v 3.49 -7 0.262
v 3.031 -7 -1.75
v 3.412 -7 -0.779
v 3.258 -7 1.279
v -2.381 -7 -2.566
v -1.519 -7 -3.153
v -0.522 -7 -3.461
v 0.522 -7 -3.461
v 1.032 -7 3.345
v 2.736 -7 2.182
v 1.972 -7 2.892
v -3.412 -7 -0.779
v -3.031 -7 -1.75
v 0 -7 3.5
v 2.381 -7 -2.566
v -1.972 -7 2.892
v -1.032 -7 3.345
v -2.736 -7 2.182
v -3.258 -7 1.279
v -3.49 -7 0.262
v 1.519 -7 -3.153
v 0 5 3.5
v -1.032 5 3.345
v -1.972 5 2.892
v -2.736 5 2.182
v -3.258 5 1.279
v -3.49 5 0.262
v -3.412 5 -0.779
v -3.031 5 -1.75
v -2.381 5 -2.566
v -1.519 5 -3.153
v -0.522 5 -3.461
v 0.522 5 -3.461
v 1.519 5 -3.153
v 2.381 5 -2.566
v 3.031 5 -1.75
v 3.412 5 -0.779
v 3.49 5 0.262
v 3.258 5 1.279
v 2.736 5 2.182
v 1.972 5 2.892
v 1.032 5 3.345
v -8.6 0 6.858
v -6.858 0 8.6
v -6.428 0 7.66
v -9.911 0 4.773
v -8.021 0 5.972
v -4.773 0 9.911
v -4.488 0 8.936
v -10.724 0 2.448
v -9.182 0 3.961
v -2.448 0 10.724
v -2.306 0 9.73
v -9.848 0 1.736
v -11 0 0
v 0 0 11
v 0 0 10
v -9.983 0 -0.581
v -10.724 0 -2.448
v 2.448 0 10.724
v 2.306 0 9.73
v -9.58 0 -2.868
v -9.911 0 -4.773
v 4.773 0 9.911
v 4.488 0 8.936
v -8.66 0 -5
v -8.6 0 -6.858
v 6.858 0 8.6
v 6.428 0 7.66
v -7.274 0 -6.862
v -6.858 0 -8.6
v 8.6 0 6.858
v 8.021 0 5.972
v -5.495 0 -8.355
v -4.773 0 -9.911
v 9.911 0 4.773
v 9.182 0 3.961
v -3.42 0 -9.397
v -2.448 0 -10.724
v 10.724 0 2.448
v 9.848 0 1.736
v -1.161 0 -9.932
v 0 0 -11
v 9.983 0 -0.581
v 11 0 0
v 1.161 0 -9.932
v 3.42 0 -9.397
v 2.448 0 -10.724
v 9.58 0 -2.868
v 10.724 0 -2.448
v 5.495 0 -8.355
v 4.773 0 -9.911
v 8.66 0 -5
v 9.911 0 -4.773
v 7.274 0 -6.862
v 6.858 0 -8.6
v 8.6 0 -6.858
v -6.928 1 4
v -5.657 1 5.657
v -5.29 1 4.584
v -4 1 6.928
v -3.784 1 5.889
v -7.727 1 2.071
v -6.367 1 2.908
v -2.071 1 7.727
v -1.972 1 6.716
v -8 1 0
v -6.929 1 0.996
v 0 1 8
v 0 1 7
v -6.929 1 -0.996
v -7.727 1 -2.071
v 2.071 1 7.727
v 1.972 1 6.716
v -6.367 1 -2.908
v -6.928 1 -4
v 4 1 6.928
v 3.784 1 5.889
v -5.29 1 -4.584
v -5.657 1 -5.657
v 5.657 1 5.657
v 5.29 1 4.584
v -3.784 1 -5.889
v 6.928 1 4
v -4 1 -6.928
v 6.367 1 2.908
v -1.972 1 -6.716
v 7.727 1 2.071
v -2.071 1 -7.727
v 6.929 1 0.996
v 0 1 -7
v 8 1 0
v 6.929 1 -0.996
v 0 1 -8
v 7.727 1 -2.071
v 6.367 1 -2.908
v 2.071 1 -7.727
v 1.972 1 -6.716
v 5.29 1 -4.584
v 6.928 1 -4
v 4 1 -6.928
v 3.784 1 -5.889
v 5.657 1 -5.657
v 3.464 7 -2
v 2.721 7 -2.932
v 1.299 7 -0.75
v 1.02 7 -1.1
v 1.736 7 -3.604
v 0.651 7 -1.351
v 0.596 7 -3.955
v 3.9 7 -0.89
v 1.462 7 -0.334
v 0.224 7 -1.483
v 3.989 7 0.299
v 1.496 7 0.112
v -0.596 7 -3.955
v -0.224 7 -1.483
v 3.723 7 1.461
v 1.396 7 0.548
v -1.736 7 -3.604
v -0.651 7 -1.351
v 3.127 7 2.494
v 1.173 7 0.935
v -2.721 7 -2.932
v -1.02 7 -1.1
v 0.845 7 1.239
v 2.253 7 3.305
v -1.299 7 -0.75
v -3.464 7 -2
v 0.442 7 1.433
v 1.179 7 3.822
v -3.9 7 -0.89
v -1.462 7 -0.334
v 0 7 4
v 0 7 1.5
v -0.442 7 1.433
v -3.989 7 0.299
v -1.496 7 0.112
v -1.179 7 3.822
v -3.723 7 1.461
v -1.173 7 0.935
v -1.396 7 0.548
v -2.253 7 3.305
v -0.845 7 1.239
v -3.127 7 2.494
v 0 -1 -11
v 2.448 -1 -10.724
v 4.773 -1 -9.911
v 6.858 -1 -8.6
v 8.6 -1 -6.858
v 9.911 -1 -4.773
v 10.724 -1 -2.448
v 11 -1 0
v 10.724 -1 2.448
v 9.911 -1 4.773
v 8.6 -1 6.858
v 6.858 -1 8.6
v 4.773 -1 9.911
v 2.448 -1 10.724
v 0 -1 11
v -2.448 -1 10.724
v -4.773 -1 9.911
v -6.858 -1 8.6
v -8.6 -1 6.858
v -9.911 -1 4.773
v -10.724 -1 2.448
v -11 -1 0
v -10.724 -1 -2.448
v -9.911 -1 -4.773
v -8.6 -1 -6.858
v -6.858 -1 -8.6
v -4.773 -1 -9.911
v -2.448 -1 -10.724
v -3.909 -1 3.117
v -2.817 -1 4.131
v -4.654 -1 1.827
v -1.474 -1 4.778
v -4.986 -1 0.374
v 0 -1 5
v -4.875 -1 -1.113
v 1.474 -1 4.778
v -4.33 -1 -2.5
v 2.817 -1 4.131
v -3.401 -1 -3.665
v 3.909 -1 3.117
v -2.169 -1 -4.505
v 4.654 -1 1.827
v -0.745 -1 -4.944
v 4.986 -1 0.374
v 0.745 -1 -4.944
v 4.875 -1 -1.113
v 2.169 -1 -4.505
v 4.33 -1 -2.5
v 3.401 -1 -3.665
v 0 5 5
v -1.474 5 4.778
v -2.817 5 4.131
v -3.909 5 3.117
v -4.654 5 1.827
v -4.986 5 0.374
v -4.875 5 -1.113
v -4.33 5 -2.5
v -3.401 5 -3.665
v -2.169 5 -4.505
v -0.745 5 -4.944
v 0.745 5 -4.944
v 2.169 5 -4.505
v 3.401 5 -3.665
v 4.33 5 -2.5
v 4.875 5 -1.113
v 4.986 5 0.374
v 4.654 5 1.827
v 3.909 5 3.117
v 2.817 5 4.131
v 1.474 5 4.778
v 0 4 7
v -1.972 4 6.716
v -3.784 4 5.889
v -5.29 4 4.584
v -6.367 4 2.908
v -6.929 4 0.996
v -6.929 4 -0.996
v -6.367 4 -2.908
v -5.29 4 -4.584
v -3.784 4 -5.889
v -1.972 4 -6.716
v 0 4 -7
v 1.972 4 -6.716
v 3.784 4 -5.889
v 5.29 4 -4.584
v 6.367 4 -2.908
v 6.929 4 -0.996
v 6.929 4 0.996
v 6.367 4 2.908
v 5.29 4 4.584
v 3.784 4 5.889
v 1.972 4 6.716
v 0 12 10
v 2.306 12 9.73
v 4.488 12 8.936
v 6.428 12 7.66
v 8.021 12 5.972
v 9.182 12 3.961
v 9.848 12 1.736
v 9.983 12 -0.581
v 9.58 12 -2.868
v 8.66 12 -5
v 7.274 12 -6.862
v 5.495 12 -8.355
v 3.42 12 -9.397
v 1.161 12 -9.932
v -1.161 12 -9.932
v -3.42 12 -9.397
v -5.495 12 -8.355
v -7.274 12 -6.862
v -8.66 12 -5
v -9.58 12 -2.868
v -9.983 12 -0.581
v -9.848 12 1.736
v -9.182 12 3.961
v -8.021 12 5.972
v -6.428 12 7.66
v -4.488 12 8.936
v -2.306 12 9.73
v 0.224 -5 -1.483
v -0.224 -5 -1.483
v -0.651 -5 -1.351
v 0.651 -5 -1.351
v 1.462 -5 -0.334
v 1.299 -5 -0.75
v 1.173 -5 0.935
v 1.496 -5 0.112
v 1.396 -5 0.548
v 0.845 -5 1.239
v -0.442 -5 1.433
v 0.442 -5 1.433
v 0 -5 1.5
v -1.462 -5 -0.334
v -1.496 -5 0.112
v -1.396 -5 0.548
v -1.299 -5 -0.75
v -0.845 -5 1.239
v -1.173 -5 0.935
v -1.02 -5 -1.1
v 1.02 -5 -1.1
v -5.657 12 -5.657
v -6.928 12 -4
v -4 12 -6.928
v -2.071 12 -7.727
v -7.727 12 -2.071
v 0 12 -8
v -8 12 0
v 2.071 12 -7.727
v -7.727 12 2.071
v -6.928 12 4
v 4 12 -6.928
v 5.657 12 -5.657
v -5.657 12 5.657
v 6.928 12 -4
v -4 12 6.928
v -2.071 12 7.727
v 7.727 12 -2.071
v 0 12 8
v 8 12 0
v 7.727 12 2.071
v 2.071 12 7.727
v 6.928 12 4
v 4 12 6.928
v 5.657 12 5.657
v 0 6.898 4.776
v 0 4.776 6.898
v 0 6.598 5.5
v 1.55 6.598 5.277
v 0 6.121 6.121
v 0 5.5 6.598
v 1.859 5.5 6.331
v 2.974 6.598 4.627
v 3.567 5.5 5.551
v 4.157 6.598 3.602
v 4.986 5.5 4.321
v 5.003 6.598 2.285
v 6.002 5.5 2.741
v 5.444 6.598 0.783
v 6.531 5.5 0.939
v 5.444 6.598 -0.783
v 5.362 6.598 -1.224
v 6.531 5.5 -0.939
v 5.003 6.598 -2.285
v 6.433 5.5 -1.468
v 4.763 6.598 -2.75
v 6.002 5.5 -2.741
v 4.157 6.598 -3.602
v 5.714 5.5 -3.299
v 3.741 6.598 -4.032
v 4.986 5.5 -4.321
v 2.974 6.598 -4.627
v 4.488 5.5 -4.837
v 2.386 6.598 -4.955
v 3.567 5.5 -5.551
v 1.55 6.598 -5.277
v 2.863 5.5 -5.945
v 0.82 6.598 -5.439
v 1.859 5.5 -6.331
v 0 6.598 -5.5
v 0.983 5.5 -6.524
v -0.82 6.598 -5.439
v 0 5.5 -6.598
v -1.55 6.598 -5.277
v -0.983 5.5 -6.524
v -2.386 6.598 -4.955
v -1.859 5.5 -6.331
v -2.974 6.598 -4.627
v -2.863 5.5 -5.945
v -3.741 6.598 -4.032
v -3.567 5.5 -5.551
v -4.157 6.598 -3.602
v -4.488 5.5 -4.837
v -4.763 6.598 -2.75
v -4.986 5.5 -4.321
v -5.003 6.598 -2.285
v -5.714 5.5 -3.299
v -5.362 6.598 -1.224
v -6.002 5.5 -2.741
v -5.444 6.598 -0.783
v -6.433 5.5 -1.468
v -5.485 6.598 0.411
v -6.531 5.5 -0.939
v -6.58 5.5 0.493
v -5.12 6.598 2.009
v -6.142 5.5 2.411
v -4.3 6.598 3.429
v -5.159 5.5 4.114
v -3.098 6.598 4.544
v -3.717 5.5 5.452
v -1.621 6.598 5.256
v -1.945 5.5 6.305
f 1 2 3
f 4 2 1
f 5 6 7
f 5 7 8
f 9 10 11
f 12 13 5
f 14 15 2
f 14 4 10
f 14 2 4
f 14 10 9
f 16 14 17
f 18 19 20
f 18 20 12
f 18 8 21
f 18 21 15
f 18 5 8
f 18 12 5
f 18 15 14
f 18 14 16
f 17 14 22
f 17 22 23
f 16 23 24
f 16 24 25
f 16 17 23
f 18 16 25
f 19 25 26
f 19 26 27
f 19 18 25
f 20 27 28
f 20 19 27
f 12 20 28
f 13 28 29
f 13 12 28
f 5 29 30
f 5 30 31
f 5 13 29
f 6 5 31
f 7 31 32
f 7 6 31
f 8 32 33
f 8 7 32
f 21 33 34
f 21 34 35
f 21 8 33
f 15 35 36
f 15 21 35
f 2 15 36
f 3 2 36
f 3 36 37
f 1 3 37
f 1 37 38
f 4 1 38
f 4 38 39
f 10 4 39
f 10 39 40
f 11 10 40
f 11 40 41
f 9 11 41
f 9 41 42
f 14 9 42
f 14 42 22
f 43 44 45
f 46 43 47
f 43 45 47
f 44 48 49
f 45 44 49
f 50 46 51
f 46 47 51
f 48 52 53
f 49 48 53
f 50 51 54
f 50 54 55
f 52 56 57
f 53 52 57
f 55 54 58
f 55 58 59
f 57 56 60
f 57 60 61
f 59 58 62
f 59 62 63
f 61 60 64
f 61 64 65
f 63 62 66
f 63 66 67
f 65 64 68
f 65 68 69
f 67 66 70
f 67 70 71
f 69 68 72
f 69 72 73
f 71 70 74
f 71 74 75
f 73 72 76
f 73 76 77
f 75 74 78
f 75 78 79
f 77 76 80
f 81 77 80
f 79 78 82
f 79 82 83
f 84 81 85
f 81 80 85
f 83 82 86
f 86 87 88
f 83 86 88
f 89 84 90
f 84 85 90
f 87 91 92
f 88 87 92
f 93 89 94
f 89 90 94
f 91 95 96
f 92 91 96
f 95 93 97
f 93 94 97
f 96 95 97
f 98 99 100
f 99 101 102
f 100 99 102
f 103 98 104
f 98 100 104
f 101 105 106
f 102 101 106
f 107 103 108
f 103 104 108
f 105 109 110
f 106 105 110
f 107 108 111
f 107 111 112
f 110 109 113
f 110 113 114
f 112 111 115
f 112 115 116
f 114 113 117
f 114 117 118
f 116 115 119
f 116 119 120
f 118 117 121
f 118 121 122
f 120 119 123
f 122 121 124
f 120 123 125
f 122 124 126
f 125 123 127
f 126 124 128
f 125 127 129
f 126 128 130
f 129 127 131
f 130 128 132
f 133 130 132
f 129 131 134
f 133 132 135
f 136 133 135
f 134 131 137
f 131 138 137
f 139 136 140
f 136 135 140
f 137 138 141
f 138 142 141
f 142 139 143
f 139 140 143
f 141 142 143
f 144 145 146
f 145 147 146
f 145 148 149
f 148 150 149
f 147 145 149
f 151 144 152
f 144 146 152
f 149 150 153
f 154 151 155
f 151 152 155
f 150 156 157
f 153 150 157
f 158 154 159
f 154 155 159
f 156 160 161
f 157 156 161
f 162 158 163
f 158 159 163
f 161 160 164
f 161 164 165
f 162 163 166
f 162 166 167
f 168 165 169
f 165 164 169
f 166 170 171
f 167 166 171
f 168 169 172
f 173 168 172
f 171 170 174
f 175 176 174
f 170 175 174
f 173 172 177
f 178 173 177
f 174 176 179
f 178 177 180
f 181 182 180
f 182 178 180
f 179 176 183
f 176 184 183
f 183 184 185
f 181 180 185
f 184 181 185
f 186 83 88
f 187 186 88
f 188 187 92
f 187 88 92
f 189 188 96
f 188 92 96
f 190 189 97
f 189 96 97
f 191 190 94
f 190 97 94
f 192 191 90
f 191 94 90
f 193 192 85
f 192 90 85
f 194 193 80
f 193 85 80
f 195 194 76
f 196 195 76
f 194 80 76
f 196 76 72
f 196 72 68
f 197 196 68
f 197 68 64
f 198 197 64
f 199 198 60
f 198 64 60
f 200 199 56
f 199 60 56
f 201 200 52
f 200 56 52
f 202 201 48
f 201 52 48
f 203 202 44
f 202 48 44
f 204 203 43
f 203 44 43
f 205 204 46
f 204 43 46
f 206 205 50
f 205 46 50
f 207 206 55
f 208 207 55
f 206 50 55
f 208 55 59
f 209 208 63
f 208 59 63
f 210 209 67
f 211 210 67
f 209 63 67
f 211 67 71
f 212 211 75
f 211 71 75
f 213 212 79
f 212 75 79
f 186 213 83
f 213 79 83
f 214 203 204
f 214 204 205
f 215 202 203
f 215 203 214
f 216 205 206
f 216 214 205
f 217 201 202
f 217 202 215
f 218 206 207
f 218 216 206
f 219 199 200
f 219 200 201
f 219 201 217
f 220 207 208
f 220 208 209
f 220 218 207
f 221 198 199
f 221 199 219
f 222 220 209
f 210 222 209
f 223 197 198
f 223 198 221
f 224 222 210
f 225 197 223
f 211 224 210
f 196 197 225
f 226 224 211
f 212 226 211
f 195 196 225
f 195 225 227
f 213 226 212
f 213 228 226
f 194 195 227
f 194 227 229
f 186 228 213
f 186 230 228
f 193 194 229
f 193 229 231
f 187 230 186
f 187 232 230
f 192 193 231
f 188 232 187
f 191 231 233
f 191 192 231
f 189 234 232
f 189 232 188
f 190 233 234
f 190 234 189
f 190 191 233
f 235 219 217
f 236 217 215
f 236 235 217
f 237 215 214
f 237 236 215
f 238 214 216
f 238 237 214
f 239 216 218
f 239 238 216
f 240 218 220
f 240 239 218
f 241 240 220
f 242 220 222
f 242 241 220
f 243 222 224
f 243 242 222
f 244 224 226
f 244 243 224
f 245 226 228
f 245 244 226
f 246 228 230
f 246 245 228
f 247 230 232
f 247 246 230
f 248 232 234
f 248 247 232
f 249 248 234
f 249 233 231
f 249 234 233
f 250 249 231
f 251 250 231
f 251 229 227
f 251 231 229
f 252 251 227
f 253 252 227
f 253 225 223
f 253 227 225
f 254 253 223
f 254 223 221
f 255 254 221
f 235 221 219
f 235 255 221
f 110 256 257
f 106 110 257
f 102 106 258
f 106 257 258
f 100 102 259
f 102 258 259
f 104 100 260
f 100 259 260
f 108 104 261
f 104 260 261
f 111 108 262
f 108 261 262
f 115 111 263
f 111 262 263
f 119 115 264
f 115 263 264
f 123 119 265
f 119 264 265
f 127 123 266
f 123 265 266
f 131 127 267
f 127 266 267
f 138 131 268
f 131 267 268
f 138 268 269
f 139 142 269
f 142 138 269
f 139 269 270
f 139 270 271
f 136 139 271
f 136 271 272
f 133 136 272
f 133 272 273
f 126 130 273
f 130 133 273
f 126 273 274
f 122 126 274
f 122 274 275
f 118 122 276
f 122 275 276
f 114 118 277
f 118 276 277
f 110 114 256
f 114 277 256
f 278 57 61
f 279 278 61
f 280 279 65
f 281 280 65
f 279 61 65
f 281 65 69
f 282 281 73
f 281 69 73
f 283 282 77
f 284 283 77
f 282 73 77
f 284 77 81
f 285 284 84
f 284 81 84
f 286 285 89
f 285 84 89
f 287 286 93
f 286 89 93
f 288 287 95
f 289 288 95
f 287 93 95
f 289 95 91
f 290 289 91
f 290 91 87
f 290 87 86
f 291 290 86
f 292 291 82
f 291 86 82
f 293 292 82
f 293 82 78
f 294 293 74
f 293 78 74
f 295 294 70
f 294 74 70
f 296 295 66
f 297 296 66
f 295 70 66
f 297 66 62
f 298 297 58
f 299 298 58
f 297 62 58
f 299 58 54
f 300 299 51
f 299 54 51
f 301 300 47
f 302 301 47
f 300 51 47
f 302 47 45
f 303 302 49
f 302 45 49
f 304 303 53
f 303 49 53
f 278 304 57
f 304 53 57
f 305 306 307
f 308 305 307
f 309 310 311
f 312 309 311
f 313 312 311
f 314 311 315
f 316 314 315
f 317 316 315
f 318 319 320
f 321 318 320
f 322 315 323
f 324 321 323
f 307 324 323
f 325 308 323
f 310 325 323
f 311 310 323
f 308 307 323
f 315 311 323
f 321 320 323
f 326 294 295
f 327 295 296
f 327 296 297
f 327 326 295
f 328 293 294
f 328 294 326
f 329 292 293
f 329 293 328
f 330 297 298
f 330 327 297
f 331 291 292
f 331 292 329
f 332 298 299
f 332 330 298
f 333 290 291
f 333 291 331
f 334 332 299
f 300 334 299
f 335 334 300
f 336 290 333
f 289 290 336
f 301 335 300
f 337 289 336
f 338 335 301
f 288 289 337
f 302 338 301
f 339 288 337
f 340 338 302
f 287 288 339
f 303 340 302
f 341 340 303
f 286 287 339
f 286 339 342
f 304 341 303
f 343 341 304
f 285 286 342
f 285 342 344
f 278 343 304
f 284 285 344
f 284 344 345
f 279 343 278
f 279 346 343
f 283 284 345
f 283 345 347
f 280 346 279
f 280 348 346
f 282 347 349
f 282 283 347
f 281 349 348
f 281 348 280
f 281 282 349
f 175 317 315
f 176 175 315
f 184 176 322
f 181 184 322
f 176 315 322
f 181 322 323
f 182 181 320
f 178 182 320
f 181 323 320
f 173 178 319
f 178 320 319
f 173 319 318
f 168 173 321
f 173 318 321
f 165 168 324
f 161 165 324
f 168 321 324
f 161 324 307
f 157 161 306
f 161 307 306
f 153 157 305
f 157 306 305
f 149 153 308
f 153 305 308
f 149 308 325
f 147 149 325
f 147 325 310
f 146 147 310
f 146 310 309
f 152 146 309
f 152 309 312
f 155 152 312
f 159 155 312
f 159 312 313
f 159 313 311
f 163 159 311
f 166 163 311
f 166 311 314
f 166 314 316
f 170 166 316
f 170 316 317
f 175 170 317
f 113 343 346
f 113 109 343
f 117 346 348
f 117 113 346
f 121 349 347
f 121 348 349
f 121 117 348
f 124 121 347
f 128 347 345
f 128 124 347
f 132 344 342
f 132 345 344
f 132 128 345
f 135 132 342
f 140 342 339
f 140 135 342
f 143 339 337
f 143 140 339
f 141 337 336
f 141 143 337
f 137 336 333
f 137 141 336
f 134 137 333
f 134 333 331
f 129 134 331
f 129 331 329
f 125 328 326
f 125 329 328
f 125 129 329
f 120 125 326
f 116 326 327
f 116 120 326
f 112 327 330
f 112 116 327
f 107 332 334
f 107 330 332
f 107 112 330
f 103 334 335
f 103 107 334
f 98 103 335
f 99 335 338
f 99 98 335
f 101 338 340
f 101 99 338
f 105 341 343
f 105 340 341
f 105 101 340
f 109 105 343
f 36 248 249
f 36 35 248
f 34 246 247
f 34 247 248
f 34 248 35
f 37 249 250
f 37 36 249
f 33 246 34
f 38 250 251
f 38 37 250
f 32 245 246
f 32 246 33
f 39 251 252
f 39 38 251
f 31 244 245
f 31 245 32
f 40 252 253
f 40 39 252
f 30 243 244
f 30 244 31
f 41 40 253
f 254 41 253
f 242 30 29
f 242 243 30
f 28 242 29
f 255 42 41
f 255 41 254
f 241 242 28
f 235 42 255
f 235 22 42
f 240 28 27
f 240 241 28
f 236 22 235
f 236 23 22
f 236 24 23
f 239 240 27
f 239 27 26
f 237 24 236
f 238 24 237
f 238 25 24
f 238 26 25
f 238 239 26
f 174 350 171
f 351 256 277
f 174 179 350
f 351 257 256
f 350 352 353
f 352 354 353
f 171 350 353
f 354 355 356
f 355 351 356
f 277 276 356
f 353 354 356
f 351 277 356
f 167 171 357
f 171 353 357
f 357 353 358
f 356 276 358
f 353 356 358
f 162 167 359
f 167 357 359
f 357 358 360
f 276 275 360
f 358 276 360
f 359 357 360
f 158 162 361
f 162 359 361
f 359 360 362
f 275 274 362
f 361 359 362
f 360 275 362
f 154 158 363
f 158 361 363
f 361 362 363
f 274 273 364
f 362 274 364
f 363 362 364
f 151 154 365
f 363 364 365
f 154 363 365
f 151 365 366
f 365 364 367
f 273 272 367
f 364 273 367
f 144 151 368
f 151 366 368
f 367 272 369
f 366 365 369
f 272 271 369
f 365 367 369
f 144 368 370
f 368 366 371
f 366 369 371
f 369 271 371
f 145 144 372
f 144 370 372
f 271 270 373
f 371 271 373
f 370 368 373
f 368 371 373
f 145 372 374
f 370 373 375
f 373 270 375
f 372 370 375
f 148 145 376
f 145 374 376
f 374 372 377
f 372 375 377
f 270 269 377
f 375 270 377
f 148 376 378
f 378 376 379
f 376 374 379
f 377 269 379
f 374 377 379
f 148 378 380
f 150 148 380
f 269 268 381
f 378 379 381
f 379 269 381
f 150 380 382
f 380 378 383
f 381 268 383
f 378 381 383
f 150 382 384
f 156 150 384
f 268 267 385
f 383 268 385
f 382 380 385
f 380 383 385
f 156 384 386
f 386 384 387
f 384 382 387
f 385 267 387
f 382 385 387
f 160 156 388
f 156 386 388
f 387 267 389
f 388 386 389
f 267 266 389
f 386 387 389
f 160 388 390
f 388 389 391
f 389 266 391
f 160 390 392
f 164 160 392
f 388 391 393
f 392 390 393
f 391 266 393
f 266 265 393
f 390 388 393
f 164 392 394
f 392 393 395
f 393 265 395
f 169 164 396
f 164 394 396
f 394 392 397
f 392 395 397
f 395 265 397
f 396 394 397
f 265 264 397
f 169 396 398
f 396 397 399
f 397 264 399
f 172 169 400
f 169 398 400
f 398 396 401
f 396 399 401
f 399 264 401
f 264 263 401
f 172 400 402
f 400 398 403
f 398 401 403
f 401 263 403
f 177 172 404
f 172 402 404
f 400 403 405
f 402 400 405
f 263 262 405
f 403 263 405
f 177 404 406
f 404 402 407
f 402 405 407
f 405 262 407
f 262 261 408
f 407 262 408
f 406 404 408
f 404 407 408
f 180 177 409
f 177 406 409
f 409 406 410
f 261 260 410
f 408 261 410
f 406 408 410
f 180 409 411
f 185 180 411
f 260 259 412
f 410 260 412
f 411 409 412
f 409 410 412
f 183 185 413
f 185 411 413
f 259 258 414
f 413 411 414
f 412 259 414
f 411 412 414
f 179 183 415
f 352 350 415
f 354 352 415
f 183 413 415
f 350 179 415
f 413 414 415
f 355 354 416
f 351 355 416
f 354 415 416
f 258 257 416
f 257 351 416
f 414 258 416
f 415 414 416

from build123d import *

# Parameters (mm, degrees)
SKETCH_1_R               = 10
EXTRUDE_1_DEPTH          = 12
SKETCH_2_R               = 11
EXTRUDE_2_DEPTH          = 1
CUT_EXTRUDE_1_DEPTH      = 21.273134933
CUT_EXTRUDE_1_DEPTH_BACK = 6
SKETCH_3_R               = 5
SKETCH_3_R_2             = 3.5
EXTRUDE_START            = 6
SKETCH_5_R               = 3.5
EXTRUDE_3_DEPTH          = 6
SHELL_1_T                = -2
FILLET_1_R               = 3


with BuildPart() as part:
    # ｽｹｯﾁ1 → ﾎﾞｽ - 押し出し1 (new body)
    with BuildSketch(Plane(origin=(0, 0, 0), x_dir=(1, 0, 0), z_dir=(0, 1, 0))):
        with Locations(Location((0, 0, 0), (0, 0, 270))):
            Circle(SKETCH_1_R)
    extrude(amount=EXTRUDE_1_DEPTH)

    # ｽｹｯﾁ2 → ﾎﾞｽ - 押し出し2 (add)
    with BuildSketch(Plane.XZ):
        with Locations(Location((0, 0, 0), (0, 0, 270))):
            Circle(SKETCH_2_R)
    extrude(amount=EXTRUDE_2_DEPTH)

    # ｽｹｯﾁ3 → ｶｯﾄ - 押し出し1 (cut, two sides: drawn at the far end of the back side and taken through both)
    with BuildSketch(Plane.XZ.offset(1).offset(-CUT_EXTRUDE_1_DEPTH_BACK)):
        with Locations(Location((0, 0, 0), (0, 0, 90))):
            Circle(SKETCH_3_R)
        with Locations(Location((0, 0, 0), (0, 0, 90))):
            Circle(SKETCH_3_R_2, mode=Mode.SUBTRACT)
    extrude(amount=CUT_EXTRUDE_1_DEPTH + CUT_EXTRUDE_1_DEPTH_BACK, mode=Mode.SUBTRACT)

    # ｽｹｯﾁ5 → ﾎﾞｽ - 押し出し3 (add)
    with BuildSketch(Plane.XZ.offset(1).offset(EXTRUDE_START)):
        with Locations(Location((0, 0, 0), (0, 0, 90))):
            Circle(SKETCH_5_R)
    extrude(amount=-EXTRUDE_3_DEPTH)

    # ｼｪﾙ1
    shell_1_openings = [part.faces().sort_by_distance(p)[0] for p in [
        (0, 12, 0),
    ]]
    offset(amount=SHELL_1_T, openings=shell_1_openings, kind=Kind.INTERSECTION)

    # ﾌｨﾚｯﾄ1
    fillet_1_edges = [part.edges().sort_by_distance(p)[0] for p in [
        (0, 7, -7),
    ]]
    fillet(fillet_1_edges, radius=FILLET_1_R)


solid = part.part
